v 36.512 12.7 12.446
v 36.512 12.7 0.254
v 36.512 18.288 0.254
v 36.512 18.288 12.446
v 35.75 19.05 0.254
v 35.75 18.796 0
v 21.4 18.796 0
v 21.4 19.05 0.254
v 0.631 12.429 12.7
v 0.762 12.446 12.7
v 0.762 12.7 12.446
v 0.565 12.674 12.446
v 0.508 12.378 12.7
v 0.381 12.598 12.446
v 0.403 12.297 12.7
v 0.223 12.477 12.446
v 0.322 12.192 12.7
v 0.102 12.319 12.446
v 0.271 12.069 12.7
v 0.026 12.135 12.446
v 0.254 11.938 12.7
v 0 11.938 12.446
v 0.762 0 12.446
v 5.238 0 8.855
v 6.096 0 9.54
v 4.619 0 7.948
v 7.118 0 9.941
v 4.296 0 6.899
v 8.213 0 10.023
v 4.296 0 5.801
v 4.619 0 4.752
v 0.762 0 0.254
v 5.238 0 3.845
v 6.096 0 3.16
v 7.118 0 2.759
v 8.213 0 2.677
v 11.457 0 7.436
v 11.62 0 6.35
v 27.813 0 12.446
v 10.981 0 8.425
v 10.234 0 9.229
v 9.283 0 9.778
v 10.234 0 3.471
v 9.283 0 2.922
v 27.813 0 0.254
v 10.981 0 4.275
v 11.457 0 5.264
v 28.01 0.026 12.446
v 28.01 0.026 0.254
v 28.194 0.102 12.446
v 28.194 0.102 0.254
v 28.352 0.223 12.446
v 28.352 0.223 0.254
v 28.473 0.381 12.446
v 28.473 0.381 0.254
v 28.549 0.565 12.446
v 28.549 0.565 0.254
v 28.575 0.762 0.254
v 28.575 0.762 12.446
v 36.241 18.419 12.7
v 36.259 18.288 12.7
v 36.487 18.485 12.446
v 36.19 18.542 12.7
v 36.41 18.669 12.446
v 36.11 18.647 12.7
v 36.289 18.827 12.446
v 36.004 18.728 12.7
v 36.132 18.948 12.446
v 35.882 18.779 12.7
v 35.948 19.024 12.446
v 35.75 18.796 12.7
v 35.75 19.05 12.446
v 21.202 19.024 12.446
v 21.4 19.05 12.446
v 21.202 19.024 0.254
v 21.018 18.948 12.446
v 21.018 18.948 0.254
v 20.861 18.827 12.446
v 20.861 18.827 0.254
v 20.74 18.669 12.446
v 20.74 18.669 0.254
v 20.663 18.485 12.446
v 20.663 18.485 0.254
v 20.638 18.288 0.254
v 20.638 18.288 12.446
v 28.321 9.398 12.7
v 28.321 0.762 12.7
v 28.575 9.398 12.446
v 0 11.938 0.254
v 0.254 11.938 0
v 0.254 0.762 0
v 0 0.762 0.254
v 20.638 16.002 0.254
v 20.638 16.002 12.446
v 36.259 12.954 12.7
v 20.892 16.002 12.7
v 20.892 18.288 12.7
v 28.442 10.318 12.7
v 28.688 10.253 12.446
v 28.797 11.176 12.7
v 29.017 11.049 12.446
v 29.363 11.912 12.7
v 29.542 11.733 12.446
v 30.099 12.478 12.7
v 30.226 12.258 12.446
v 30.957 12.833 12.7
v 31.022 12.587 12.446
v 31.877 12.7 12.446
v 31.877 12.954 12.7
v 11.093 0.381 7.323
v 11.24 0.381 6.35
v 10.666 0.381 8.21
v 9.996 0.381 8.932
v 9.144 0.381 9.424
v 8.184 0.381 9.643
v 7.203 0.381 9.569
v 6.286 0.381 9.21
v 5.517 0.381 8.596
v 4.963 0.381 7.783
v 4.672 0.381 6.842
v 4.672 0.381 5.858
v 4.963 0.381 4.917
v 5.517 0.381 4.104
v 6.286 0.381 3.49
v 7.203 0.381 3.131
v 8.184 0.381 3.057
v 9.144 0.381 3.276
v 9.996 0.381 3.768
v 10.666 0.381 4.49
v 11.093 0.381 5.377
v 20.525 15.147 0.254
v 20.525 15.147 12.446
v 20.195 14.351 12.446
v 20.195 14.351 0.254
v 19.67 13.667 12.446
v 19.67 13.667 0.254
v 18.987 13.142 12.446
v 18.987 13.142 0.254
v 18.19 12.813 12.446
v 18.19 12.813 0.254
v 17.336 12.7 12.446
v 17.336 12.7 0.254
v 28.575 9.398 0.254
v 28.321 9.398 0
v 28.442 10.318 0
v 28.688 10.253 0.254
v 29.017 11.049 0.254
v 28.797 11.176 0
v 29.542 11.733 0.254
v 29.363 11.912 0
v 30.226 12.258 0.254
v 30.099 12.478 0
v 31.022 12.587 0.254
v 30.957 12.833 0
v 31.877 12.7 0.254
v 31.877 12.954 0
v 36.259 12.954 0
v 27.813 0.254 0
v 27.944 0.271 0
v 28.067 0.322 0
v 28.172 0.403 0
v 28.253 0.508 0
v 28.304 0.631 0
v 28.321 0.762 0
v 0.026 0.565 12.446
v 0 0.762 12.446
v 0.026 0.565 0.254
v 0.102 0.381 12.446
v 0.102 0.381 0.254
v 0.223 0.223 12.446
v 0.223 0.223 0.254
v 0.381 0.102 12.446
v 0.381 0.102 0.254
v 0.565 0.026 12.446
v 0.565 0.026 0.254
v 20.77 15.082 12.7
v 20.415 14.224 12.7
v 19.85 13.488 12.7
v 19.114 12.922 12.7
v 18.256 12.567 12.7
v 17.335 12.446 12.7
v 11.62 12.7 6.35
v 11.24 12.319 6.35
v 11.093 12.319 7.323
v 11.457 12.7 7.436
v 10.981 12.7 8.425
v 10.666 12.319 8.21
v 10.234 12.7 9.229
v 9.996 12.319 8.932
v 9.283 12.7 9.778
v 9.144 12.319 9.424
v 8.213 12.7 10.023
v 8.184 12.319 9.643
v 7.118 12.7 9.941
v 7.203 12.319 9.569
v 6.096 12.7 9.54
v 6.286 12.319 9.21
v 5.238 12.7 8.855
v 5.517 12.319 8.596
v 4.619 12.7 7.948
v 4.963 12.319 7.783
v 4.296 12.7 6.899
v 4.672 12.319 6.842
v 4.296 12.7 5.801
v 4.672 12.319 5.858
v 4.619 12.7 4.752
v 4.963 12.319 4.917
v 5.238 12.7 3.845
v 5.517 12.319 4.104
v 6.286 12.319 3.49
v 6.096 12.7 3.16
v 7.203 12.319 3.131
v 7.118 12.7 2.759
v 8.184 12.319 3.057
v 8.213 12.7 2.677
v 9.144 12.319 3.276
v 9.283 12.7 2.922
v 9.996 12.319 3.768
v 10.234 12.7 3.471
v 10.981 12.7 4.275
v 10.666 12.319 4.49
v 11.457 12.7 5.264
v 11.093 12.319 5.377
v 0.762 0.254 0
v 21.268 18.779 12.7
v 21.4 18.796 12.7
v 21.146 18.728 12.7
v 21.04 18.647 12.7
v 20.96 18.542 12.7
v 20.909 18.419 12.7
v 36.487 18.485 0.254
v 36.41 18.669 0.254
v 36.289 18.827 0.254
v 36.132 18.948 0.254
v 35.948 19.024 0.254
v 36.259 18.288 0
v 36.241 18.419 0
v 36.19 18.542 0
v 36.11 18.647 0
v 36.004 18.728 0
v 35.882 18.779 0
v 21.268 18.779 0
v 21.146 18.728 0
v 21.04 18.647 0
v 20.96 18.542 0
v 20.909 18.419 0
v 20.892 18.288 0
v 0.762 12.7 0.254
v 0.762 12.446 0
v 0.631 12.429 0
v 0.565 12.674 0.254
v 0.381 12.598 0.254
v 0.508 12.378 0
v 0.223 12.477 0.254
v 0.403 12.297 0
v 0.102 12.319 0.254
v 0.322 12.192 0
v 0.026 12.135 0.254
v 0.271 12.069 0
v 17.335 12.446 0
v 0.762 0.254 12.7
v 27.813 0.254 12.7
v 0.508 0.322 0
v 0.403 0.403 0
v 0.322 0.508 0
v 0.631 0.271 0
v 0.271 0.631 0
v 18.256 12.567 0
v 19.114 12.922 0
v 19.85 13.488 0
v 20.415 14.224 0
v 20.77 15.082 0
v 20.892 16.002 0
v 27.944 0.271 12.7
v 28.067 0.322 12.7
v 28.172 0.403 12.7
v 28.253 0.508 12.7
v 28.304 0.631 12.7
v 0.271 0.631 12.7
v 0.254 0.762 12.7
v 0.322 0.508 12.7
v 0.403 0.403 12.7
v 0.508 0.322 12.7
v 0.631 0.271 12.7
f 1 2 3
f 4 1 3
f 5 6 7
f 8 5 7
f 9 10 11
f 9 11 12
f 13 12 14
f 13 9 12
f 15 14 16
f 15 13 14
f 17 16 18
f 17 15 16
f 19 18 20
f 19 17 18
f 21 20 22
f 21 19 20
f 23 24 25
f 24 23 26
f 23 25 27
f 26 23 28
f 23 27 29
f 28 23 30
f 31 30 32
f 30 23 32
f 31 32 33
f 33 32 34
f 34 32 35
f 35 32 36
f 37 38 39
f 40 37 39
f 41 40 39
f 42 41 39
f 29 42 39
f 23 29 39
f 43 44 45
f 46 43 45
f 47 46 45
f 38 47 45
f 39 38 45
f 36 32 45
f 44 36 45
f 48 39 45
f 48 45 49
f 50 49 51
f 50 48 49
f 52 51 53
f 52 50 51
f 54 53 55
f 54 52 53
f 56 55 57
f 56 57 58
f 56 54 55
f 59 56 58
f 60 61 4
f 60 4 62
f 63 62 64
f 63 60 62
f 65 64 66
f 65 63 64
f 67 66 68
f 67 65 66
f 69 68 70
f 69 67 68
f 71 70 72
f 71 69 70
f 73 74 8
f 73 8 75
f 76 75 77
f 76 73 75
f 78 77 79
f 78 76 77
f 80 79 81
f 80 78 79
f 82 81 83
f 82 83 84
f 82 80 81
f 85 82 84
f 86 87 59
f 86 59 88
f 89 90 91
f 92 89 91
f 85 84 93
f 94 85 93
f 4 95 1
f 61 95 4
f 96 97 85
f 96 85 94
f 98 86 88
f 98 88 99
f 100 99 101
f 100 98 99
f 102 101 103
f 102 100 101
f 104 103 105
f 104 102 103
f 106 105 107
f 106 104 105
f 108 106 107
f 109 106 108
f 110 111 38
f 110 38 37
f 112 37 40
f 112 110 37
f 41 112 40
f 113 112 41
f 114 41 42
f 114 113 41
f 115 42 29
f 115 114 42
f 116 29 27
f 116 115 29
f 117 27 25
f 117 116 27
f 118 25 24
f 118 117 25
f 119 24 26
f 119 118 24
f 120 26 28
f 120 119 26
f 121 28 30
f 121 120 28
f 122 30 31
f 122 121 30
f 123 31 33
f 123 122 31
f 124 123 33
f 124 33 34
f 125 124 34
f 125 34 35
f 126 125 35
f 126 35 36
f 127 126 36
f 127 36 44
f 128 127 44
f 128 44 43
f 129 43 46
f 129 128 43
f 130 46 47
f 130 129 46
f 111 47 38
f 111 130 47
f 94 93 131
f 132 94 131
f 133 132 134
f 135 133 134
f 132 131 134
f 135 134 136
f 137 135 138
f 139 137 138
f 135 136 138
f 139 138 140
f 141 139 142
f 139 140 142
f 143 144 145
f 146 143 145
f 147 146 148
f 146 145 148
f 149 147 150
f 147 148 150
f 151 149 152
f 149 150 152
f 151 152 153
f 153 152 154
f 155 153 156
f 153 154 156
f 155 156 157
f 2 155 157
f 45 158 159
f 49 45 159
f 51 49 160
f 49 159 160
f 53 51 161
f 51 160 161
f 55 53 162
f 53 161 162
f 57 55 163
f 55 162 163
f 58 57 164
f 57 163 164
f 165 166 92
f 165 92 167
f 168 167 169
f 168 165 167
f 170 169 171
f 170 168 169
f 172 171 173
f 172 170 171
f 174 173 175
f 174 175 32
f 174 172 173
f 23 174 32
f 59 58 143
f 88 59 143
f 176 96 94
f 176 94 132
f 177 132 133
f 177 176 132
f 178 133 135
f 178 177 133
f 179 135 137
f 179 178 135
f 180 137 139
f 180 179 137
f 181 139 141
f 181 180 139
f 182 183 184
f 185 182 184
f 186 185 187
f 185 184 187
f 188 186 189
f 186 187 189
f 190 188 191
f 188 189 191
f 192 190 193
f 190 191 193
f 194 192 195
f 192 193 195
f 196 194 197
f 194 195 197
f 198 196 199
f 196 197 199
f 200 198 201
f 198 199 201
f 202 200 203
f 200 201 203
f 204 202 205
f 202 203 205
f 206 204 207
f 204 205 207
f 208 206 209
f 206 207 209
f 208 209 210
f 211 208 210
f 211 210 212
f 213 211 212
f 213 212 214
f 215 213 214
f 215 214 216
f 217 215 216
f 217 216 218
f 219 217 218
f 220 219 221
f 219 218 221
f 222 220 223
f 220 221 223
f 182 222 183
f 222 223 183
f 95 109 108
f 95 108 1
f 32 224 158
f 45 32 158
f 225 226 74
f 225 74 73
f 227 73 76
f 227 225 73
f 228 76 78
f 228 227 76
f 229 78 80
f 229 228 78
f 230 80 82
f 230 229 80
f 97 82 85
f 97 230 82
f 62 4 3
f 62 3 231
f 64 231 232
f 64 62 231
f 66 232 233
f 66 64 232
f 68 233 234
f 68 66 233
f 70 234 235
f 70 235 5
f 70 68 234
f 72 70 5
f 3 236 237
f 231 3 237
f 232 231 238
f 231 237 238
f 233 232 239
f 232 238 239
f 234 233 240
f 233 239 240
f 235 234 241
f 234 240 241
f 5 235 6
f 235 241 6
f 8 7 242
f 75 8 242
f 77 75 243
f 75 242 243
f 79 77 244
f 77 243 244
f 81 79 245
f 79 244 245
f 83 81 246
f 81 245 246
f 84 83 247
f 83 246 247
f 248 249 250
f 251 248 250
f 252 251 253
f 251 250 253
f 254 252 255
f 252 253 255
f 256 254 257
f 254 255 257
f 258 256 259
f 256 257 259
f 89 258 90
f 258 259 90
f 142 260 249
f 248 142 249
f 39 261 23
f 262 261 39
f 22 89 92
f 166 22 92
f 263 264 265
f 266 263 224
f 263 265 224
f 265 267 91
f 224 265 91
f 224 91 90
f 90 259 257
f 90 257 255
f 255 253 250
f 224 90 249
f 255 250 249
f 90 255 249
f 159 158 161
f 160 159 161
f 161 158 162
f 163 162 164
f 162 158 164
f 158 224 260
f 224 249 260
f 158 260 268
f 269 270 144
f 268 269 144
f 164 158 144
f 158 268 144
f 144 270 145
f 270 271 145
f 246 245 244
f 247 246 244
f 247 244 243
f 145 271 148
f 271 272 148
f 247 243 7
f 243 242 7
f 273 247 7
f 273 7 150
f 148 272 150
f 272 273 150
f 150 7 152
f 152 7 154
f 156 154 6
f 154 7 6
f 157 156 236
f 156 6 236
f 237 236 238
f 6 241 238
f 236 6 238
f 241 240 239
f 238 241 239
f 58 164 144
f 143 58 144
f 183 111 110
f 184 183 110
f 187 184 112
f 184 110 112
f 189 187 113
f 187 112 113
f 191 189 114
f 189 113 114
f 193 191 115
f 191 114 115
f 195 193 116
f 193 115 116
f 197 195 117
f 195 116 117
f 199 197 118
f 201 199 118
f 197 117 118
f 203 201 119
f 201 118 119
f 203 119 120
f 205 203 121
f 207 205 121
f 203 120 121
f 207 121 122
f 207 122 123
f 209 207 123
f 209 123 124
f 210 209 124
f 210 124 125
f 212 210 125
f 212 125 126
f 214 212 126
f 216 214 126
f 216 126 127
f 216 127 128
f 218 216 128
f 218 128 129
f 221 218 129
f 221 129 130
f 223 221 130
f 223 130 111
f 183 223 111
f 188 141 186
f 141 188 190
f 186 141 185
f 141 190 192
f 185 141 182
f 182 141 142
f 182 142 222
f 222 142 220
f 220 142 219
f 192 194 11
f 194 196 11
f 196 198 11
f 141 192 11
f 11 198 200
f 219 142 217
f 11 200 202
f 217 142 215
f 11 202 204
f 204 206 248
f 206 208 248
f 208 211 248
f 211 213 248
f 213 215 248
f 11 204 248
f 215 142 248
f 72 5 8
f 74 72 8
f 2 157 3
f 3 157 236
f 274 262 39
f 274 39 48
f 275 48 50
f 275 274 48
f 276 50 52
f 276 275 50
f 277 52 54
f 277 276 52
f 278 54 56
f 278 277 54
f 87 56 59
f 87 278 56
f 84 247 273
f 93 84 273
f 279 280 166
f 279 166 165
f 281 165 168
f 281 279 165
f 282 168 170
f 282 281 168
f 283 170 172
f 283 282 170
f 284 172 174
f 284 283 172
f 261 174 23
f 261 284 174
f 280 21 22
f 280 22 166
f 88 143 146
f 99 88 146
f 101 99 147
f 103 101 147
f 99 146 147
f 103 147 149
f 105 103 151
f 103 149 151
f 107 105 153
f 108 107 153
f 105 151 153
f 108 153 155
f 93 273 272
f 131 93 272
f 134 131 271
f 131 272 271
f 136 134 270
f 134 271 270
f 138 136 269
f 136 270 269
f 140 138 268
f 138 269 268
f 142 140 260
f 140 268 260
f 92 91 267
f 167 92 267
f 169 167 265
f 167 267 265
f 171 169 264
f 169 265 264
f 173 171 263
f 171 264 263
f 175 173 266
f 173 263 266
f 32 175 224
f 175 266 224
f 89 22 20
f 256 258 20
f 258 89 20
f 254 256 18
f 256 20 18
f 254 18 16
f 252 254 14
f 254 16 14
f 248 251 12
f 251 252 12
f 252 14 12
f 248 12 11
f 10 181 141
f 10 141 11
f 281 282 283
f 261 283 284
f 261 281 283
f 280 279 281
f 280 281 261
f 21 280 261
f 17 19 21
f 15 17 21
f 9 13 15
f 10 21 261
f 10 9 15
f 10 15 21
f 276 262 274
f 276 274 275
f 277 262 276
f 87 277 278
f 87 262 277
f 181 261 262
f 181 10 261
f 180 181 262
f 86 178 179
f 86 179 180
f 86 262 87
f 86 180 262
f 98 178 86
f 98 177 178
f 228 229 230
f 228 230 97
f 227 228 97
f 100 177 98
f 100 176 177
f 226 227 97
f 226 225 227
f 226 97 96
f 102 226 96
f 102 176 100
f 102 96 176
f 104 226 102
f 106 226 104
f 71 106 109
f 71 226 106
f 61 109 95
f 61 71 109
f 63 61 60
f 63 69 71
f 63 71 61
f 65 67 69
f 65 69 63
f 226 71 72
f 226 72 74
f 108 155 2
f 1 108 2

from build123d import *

# Parameters (mm, degrees)
F1_DEPTH = 12.7
F2_R     = 0.762
F3_R     = 3.302
F4_DEPTH = 19.051
F5_SIZE  = 0.381
F6_SIZE  = 0.254


with BuildPart() as f1:
    # F0 (on Top) → F1 (new body)
    with BuildSketch(Plane.XY):
        with BuildLine():
            Line((0, 12.7), (0, 0))
            Line((0, 0), (28.575, 0))
            Line((28.575, 0), (28.575, 9.398))
            ThreePointArc((28.575, 9.398), (29.542133, 11.732867), (31.877, 12.7))
            Line((31.877, 12.7), (36.5125, 12.7))
            Line((36.5125, 12.7), (36.5125, 19.05))
            Line((36.5125, 19.05), (20.6375, 19.05))
            Line((20.6375, 19.05), (20.6375, 16.002))
            ThreePointArc((20.6375, 16.002), (19.670367, 13.667133), (17.3355, 12.7))
            Line((17.3355, 12.7), (0, 12.7))
        make_face()
    extrude(amount=F1_DEPTH)

    # F2
    f2_edges = [f1.edges().sort_by_distance(p)[0] for p in [
        (28.575, 0, 6.35),
        (0, 0, 6.35),
        (0, 12.7, 6.35),
        (20.6375, 19.05, 6.35),
        (36.5125, 19.05, 6.35),
    ]]
    fillet(f2_edges, radius=F2_R)

    # F3 (on face) → F4 (cut, through all)
    with BuildSketch(Plane.XZ):
        with Locations((7.9375, 6.35)):
            Circle(F3_R)
    extrude(amount=-F4_DEPTH, mode=Mode.SUBTRACT)

    # F5
    f5_edges = [f1.edges().sort_by_distance(p)[0] for p in [
        (4.6355, 12.7, 6.35),
        (4.6355, 0, 6.35),
    ]]
    chamfer(f5_edges, length=F5_SIZE)

    # F6
    f6_edges = [f1.edges().sort_by_distance(p)[0] for p in [
        (9.04875, 12.7, 12.7),
        (0.223185, 12.476815, 12.7),
        (19.670367, 13.667133, 12.7),
        (0, 6.35, 12.7),
        (20.6375, 17.145, 12.7),
        (0.223185, 0.223185, 12.7),
        (20.860685, 18.826815, 12.7),
        (14.2875, 0, 12.7),
        (28.575, 19.05, 12.7),
        (28.351815, 0.223185, 12.7),
        (36.289315, 18.826815, 12.7),
        (28.575, 5.08, 12.7),
        (36.5125, 15.494, 12.7),
        (29.542133, 11.732867, 12.7),
        (34.19475, 12.7, 12.7),
        (9.04875, 12.7, 0),
        (0.223185, 12.476815, 0),
        (19.670367, 13.667133, 0),
        (0, 6.35, 0),
        (20.6375, 17.145, 0),
        (0.223185, 0.223185, 0),
        (20.860685, 18.826815, 0),
        (14.2875, 0, 0),
        (28.575, 19.05, 0),
        (28.351815, 0.223185, 0),
        (36.289315, 18.826815, 0),
        (28.575, 5.08, 0),
        (36.5125, 15.494, 0),
        (29.542133, 11.732867, 0),
        (34.19475, 12.7, 0),
    ]]
    chamfer(f6_edges, length=F6_SIZE)


solid = f1.part
